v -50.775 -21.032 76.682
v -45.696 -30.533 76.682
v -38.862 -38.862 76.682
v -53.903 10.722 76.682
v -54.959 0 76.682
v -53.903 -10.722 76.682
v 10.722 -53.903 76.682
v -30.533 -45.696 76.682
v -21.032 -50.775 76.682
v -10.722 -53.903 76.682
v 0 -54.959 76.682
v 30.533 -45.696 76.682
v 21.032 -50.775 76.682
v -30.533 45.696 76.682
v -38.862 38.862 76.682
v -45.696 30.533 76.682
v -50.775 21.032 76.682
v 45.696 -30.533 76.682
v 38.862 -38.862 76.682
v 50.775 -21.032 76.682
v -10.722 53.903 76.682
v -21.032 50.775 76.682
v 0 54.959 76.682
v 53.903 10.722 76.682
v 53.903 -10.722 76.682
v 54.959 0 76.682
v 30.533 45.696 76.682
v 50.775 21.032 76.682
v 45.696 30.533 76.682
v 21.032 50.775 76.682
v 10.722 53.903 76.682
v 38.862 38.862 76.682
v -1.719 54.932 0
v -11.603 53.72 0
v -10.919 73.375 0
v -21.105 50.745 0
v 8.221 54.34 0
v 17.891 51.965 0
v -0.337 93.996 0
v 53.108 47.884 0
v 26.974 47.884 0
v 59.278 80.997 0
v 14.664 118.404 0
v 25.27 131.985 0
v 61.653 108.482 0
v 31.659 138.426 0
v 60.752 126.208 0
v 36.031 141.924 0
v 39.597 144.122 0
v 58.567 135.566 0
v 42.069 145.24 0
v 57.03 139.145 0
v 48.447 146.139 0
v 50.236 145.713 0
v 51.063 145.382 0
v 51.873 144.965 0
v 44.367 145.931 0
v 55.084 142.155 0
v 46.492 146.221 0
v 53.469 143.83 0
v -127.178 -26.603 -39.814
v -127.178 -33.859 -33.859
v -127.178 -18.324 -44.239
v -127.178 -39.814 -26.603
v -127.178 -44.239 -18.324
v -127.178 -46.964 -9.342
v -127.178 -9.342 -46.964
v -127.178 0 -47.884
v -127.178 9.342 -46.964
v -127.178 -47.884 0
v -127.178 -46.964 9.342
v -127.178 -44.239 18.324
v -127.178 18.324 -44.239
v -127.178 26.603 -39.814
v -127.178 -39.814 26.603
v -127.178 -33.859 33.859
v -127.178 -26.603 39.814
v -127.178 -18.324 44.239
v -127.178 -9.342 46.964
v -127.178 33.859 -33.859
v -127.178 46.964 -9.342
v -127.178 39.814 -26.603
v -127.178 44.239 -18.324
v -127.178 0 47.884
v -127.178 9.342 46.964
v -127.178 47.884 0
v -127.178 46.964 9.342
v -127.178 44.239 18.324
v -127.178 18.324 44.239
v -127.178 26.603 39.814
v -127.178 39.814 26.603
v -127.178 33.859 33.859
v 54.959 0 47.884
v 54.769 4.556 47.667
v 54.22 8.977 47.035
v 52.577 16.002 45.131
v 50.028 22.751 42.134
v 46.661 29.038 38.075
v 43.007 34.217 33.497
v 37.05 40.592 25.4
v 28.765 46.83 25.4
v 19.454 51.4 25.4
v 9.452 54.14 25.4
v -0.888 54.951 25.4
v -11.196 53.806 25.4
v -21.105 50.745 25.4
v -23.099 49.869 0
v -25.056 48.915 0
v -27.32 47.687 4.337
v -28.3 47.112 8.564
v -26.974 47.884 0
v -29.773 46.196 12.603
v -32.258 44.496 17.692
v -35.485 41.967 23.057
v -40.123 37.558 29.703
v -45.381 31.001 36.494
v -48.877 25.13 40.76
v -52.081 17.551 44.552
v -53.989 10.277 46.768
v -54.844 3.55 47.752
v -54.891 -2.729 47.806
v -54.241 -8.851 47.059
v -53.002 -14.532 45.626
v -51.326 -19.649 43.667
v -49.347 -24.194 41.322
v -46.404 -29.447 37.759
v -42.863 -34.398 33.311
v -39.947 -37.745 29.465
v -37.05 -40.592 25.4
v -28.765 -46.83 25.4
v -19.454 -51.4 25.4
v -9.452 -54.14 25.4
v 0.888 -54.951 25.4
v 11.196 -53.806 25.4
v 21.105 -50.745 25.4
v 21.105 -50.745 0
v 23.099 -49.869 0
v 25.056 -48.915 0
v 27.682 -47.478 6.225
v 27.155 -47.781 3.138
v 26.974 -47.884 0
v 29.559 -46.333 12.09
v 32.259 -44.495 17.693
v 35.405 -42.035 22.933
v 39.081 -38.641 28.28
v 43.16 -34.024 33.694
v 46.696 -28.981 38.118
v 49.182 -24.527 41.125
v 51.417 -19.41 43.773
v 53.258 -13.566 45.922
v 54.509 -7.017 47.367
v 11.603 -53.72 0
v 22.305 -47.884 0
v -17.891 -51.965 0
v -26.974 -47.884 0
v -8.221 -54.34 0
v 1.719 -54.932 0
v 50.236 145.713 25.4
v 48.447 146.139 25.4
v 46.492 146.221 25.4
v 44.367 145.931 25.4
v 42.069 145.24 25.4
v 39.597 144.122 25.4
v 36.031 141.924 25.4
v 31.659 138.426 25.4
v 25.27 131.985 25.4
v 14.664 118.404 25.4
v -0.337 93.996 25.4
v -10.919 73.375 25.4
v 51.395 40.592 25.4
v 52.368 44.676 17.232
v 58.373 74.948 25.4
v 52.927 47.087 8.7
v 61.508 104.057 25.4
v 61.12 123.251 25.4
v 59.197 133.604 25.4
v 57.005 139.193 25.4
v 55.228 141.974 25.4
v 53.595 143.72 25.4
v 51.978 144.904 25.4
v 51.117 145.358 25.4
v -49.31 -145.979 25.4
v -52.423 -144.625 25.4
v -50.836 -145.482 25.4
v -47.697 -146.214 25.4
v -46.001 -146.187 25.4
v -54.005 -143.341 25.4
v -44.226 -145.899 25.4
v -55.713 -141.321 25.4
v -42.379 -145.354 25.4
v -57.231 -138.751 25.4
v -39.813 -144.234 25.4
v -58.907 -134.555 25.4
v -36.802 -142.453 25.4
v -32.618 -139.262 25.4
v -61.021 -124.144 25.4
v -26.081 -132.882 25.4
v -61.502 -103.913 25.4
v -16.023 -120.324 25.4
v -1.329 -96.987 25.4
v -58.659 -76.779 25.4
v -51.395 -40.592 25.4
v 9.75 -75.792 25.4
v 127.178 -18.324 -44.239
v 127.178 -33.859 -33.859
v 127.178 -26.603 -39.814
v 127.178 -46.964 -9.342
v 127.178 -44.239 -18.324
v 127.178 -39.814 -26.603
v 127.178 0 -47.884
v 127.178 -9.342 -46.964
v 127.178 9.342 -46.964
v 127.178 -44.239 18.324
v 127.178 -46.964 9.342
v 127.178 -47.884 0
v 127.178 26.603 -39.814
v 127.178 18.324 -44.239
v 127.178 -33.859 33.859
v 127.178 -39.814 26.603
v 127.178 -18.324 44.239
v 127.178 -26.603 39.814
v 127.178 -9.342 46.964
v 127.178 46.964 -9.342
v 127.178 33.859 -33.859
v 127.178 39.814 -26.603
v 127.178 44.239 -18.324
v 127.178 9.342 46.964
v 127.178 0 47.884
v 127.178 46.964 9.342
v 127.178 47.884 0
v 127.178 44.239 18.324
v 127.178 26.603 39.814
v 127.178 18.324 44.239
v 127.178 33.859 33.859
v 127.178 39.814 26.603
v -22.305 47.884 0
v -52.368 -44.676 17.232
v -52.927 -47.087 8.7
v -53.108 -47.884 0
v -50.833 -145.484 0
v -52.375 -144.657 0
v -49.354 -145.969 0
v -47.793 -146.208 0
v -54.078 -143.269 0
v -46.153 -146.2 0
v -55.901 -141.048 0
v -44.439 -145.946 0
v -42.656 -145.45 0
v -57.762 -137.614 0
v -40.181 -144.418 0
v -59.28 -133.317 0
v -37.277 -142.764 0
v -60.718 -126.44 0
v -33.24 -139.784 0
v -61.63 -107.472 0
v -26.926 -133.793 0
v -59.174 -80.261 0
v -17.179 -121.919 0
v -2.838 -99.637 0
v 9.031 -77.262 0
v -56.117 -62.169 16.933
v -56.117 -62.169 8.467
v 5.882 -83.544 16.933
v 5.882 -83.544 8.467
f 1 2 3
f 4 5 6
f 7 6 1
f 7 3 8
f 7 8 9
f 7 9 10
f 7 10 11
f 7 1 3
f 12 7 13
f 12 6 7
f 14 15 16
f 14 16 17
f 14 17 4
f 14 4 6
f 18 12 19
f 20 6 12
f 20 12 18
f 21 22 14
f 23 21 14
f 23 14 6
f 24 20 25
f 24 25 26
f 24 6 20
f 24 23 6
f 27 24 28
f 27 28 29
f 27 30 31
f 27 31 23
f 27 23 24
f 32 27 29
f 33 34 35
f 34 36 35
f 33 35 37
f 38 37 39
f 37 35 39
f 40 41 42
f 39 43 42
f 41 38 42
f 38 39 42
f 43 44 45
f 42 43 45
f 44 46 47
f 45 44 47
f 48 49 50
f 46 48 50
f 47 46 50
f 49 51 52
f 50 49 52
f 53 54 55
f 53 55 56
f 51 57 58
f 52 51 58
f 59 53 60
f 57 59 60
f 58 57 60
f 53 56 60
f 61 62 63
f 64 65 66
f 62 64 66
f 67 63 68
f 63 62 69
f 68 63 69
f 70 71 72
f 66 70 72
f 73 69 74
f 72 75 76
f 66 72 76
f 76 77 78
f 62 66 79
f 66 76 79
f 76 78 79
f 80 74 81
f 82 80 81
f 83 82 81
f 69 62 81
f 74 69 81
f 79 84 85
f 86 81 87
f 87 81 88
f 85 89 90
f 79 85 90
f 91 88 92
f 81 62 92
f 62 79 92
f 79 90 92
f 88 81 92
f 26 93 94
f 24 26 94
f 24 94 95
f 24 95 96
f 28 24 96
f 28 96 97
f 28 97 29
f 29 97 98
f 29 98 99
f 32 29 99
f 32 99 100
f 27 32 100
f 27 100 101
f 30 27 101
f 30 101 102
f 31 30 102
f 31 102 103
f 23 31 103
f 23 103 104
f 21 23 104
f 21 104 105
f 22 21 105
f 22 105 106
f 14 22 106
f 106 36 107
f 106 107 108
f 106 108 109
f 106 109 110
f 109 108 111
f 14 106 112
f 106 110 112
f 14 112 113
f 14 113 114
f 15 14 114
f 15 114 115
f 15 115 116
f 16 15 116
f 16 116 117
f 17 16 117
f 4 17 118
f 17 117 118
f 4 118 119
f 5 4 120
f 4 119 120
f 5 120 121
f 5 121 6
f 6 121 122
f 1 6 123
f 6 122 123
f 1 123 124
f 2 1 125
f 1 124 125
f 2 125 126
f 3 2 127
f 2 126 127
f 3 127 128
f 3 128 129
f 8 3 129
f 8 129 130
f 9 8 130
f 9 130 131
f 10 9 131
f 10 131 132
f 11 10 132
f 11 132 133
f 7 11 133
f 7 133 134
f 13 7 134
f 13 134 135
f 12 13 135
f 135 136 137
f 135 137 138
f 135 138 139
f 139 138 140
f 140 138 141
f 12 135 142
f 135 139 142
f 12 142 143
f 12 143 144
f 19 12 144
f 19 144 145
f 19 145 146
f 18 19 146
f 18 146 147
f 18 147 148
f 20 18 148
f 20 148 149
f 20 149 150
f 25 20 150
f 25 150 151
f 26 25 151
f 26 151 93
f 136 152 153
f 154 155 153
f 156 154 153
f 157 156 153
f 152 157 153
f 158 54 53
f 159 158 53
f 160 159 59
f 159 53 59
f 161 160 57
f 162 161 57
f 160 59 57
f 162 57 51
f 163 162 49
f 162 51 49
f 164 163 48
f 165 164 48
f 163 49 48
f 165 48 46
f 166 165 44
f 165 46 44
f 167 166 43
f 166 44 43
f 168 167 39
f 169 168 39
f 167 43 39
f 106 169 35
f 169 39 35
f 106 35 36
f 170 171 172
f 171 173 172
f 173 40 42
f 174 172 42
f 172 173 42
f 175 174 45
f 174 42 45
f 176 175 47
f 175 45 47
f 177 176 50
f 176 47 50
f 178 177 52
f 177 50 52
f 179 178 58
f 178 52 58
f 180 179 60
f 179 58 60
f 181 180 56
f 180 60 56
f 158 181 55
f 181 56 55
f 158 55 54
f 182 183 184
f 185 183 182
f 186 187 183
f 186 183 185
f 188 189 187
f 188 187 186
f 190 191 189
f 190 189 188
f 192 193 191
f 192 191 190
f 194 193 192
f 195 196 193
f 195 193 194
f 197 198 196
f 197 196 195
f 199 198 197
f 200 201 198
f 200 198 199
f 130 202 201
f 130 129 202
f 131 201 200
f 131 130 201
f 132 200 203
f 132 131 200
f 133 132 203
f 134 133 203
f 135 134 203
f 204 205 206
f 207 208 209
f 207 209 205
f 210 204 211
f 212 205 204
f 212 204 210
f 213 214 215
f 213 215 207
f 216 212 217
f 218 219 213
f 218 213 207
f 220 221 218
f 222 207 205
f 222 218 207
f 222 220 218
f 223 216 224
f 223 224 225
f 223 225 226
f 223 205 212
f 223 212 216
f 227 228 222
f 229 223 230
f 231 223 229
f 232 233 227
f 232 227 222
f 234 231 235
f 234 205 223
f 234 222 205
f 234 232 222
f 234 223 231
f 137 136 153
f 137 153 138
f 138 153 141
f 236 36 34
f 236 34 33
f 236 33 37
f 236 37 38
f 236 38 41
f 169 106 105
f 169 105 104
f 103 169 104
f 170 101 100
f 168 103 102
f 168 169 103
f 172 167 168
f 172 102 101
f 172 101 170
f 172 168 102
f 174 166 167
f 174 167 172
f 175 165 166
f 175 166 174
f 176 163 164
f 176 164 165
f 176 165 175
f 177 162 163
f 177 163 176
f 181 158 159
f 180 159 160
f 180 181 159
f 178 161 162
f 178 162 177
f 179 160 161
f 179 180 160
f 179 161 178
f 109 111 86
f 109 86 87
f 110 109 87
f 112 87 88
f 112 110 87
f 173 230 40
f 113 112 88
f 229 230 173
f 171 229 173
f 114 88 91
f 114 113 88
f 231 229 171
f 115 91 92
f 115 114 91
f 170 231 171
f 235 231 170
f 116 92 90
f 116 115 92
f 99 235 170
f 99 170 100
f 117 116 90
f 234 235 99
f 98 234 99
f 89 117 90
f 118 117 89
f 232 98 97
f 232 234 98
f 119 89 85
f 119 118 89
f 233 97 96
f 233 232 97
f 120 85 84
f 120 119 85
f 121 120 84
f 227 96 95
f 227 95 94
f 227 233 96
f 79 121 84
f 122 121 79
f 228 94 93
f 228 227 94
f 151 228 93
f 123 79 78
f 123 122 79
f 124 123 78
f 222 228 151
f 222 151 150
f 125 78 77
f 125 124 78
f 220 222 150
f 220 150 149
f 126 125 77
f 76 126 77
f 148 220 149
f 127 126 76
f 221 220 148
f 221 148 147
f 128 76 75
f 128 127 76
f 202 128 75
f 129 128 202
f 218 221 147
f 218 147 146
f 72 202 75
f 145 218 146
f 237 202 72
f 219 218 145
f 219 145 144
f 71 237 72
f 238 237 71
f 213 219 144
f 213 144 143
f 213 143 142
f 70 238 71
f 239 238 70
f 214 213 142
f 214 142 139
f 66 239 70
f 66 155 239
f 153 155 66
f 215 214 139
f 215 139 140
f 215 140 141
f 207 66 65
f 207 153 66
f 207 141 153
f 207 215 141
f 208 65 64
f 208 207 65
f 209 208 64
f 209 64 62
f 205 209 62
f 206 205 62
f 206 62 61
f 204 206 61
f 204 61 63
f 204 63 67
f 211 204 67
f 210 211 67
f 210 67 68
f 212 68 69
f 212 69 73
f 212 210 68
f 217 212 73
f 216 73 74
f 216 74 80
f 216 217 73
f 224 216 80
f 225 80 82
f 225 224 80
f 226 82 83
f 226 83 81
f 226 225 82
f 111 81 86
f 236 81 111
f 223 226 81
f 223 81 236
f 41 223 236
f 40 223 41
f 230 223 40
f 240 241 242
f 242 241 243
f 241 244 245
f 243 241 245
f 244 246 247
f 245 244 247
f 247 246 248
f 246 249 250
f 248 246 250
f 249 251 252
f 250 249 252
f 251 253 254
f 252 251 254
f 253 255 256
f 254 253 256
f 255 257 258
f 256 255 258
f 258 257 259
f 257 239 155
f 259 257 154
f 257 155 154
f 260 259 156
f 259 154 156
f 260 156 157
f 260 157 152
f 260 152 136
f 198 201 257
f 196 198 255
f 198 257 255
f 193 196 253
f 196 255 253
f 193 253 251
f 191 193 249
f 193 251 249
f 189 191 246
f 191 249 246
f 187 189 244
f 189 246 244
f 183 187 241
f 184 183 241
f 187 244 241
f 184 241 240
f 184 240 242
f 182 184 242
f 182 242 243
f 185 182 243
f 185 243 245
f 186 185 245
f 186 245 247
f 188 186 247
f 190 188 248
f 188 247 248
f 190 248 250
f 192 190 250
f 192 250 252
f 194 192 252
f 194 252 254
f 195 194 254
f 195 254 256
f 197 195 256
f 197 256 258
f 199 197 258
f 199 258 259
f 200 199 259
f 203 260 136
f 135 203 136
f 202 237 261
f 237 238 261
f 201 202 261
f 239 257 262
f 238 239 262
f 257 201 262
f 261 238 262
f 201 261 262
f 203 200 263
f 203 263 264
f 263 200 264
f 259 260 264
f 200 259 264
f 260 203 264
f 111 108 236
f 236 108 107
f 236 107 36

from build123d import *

# Parameters (mm, degrees)
F0_R     = 54.958528
F1_DEPTH = 76.682307
F3_DEPTH = 25.4
F4_R     = 47.883921
F5_DEPTH = 127.17773


with BuildPart() as f1:
    # F0 (on Top) → F1 (new body)
    with BuildSketch(Plane.XY):
        Circle(F0_R)
    extrude(amount=F1_DEPTH)

    # F2 (on Top) → F3 (join)
    with BuildSketch(Plane.XY):
        with BuildLine():
            add(Edge.make_bspline(
                [(50.235592, 145.712793), (-11.763133, 167.087324), (-56.117159, -62.169131), (-100.471184, -291.425586), (5.881567, -83.543662), (112.234317, 124.338262), (50.235592, 145.712793)],
                knots=[0, 0, 0, 2.094395, 2.094395, 4.18879, 4.18879, 6.283185, 6.283185, 6.283185], degree=2, weights=[1, 0.5, 1, 0.5, 1, 0.5, 1]))
        make_face()
    extrude(amount=F3_DEPTH)

    # F4 (on Right) → F5 (join, symmetric)
    with BuildSketch(Plane.YZ):
        Circle(F4_R)
    extrude(amount=F5_DEPTH, both=True)


solid = f1.part
